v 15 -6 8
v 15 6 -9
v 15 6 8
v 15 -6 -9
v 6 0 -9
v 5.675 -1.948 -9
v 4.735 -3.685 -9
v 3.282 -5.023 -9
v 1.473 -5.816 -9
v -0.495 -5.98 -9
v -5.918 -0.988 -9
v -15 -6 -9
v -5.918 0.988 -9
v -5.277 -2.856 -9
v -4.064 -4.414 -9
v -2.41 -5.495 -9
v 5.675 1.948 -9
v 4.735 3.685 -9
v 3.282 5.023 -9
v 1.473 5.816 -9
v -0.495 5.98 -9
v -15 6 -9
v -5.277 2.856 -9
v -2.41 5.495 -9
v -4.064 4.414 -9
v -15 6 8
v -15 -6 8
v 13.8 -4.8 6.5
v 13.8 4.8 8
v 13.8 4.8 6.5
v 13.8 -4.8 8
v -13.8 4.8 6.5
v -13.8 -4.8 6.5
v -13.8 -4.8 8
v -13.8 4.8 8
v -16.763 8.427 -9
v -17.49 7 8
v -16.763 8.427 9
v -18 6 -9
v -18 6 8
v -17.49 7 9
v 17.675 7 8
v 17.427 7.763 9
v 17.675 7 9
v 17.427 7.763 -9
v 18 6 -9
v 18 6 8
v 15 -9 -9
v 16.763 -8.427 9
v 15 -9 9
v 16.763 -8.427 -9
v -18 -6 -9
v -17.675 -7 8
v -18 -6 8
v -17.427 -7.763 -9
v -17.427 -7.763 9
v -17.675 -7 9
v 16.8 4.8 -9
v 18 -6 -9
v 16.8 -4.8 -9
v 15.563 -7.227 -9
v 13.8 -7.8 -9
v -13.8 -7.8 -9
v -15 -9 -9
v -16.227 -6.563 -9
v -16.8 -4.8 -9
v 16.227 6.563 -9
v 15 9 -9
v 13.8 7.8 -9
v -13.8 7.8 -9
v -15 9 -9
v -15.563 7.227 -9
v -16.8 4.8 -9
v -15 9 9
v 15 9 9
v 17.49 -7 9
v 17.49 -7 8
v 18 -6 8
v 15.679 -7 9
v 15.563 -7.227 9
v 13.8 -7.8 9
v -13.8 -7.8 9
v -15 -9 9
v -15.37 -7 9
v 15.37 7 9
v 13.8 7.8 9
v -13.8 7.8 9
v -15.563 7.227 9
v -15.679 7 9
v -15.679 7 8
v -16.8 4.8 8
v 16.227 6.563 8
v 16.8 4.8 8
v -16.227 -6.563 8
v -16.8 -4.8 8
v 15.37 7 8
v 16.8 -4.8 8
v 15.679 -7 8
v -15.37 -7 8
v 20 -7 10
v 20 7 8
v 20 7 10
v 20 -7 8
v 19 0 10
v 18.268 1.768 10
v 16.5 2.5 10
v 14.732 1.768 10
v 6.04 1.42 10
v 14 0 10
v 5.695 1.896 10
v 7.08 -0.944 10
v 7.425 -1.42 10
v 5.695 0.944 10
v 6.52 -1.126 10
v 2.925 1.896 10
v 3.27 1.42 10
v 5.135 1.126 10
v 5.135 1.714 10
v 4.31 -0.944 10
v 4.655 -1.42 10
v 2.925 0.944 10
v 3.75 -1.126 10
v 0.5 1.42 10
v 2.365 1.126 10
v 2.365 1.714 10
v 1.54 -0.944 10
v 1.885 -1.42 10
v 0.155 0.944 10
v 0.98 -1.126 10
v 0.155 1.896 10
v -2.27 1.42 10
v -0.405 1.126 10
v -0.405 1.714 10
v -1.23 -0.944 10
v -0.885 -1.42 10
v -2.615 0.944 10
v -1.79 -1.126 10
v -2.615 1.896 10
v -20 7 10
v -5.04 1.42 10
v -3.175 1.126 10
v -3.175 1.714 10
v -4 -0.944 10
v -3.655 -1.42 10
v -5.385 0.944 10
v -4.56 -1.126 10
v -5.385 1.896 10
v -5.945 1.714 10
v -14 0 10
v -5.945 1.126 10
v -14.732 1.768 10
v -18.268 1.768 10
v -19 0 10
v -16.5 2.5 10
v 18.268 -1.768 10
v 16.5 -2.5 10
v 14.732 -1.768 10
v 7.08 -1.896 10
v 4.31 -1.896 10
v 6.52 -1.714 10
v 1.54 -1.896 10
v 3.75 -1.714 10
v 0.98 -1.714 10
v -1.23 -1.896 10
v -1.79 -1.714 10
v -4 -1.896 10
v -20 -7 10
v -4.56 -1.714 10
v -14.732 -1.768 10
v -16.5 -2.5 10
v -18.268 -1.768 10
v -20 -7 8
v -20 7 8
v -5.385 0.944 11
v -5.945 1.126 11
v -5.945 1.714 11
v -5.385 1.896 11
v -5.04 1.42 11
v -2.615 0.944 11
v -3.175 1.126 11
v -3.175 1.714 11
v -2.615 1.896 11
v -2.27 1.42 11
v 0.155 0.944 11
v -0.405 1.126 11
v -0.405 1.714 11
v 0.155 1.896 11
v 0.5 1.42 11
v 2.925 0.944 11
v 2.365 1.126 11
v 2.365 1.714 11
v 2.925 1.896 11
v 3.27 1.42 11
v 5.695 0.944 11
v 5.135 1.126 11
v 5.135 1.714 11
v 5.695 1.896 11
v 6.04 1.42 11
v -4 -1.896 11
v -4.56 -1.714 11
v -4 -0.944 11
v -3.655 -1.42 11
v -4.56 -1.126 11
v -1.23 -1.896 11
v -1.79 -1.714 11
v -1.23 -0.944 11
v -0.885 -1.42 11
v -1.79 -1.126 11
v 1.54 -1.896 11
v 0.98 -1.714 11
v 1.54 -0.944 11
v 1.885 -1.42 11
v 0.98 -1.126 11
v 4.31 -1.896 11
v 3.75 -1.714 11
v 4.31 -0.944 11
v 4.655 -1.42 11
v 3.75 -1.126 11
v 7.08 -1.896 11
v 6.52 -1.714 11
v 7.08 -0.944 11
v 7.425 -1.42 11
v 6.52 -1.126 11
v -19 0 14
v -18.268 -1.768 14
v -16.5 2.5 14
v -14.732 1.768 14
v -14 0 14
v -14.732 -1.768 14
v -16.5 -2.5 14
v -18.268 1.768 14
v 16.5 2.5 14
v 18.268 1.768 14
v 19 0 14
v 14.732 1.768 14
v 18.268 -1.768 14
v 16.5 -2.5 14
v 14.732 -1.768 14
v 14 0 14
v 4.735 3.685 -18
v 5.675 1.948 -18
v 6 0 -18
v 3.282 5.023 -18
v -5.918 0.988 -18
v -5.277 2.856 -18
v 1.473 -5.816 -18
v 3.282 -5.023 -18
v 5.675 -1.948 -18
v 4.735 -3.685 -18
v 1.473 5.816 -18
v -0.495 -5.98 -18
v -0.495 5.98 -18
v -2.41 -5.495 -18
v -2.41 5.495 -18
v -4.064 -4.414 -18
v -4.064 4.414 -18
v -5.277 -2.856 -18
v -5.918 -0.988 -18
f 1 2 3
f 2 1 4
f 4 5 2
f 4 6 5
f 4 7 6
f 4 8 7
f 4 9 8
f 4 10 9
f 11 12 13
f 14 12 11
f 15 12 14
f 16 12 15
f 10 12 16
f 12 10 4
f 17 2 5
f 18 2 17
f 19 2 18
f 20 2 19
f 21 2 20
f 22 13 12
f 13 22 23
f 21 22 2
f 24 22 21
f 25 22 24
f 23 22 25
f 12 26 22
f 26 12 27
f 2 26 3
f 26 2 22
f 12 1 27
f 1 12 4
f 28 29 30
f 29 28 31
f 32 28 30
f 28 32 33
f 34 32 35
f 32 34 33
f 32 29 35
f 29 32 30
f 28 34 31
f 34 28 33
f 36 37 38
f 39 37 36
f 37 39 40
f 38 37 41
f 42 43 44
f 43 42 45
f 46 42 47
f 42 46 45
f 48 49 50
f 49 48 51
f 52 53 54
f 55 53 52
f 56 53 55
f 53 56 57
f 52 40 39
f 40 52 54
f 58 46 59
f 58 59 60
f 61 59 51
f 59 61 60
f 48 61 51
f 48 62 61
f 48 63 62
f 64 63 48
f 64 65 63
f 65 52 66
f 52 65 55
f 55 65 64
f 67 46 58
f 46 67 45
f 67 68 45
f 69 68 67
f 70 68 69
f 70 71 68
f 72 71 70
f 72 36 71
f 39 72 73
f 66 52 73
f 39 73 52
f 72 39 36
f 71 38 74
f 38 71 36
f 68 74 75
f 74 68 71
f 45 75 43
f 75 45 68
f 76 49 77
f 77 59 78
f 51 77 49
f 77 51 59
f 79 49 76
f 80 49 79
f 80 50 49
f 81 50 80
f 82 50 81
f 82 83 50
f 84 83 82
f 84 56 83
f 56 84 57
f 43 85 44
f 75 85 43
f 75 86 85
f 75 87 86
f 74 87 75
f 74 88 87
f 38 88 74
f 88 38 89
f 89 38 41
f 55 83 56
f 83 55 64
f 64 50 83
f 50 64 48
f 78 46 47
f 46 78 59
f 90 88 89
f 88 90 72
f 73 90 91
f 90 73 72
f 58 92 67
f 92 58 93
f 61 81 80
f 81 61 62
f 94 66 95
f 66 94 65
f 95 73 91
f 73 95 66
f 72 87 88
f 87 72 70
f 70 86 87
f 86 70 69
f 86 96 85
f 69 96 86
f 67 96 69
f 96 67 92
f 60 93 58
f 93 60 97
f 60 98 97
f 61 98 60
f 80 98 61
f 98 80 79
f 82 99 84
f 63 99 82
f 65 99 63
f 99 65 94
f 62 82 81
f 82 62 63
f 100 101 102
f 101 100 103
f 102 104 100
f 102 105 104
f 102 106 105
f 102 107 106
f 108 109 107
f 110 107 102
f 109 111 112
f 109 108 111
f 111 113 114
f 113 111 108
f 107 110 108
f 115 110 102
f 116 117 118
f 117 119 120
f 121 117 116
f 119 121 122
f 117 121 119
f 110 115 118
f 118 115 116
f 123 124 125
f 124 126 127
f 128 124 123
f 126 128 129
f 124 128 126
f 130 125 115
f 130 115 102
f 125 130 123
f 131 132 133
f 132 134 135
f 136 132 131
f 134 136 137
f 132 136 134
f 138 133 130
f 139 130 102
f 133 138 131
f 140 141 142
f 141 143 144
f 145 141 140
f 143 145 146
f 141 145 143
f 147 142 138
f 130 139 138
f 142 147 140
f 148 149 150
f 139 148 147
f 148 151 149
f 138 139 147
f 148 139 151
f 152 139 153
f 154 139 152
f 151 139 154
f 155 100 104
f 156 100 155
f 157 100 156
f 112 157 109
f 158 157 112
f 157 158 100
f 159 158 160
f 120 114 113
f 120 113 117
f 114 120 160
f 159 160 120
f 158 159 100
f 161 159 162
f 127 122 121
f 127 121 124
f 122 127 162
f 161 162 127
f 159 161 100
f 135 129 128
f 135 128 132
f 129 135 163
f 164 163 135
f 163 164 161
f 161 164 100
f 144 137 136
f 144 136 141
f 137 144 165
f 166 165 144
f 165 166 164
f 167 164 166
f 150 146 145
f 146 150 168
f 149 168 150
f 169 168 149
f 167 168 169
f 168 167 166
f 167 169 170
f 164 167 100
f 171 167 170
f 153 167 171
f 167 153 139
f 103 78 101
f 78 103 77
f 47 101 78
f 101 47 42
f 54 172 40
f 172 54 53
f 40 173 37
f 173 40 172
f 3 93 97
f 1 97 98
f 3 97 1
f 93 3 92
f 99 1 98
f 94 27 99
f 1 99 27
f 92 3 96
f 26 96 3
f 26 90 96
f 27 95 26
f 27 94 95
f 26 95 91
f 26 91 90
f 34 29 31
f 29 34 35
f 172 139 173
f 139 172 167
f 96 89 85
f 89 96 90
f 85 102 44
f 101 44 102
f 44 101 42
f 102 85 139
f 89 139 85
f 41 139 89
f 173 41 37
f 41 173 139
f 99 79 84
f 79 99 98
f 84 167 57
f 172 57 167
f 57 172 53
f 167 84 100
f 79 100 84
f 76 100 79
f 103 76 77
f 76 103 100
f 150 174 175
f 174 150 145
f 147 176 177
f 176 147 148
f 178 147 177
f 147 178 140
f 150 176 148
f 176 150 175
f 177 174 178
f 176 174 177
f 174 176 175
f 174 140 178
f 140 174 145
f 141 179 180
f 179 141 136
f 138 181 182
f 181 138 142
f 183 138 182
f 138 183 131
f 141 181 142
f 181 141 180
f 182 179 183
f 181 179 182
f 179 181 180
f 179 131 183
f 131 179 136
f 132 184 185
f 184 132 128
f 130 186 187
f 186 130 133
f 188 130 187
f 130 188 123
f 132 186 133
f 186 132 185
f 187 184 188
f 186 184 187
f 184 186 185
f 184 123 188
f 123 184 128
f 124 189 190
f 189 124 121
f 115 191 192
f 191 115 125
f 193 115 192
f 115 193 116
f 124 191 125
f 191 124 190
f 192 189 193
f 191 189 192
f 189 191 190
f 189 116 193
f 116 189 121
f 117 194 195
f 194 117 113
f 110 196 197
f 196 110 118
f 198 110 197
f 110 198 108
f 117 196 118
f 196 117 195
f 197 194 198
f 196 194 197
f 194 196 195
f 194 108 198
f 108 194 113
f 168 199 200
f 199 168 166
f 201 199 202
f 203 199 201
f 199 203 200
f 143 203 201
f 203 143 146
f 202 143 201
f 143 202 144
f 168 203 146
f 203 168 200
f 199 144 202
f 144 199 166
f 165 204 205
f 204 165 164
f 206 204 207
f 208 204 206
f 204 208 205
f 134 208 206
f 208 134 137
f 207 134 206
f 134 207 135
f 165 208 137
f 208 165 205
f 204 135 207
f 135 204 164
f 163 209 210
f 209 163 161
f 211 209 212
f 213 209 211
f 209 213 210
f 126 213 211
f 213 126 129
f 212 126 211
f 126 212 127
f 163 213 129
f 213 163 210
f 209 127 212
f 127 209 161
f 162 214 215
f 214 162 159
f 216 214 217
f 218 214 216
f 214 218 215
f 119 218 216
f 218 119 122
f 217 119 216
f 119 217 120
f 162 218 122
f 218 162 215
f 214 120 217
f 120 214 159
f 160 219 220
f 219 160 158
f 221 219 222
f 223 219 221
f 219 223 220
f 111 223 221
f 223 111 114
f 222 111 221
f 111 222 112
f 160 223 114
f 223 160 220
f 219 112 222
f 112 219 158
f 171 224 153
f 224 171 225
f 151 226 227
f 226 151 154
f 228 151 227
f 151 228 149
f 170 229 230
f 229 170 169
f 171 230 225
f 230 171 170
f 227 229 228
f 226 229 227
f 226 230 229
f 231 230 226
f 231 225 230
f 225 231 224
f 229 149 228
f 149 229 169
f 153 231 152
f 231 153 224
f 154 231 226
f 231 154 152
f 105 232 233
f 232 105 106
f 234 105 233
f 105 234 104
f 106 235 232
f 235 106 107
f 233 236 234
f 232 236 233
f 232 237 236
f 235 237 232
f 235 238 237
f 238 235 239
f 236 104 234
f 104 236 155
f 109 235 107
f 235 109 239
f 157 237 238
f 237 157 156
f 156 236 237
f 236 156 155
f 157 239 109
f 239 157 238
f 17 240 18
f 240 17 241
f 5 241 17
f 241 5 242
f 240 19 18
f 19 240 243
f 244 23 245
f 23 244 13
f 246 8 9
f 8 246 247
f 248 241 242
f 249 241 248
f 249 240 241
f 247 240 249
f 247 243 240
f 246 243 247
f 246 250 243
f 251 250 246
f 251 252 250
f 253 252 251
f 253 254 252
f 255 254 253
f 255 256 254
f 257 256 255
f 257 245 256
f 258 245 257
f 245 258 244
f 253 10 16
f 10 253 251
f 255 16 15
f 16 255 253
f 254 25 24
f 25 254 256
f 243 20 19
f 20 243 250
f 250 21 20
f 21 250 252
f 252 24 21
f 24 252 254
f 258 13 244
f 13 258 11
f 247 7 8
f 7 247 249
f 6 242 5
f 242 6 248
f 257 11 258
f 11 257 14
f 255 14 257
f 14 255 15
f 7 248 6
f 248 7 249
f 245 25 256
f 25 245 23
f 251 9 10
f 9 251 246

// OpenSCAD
// Parameters
body_width = 30; //[15:60:1]
body_height = 12; //[6:24:1]
body_depth = 18; //[9:36:1]
shell_thickness = 1.2; //[0.6:2.4:0.1]
face_recess_depth = 1.5; //[0.8:3:0.1]
flange_width = 40; //[20:80:1]
flange_height = 14; //[7:28:1]
flange_thickness = 2; //[1:4:0.1]
mount_hole_diameter = 3.2; //[1.6:6.4:0.1]
mount_hole_spacing = 33; //[16.5:66:0.5]
pin_rows = 2; //[1:3:1]
pins_per_row = 5; //[3:15:1]
pin_pitch_x = 2.77; //[1.5:5.5:0.01]
pin_pitch_y = 2.84; //[1.5:6:0.01]
pin_diameter = 1; //[0.5:2:0.05]
pin_length = 3; //[1.5:8:0.1]
overlap = 1; //[0.5:2:0.1]
shell_corner_radius = 3; //[1.5:6:0.1]
lip_height = 0.8; //[0.4:2:0.1]
lip_thickness = 0.8; //[0.4:2:0.1]
key_width = 4; //[2:8:0.1]
key_height = 2; //[1:4:0.1]
key_depth = 1.2; //[0.6:3:0.1]
jackscrew_diameter = 5; //[3:8:0.1]
jackscrew_length = 6; //[3:12:0.1]
strain_relief_diameter = 12; //[6:24:0.5]
strain_relief_length = 10; //[5:25:0.5]
pin_chamfer_scale = 0.75; //[0.5:0.95:0.01]
shell_chamfer_scale = 0.92; //[0.85:0.98:0.01]

// Base Shapes
module connector_body() {
  color("DimGray")
  translate([0, 0, 0])
    cube([body_width, body_height, body_depth], center=true);
}

module d_shaped_shell_outer() {
  color("Silver")
  translate([0, 0, 0])
    linear_extrude(height=body_depth, center=true)
      offset(r=shell_corner_radius)
        square([body_width, body_height], center=true);
}

module d_shaped_shell_inner() {
  translate([0, 0, 0])
    linear_extrude(height=body_depth + 2*overlap, center=true)
      offset(r=shell_corner_radius)
        square([body_width - 2*shell_thickness, body_height - 2*shell_thickness], center=true);
}

module mating_face_recess_cut() {
  translate([0, 0, body_depth/2 - face_recess_depth/2])
    cube([body_width - 2*shell_thickness, body_height - 2*shell_thickness, face_recess_depth + 2*overlap], center=true);
}

module mounting_flange_blank() {
  color("Silver")
  translate([0, 0, body_depth/2 - flange_thickness/2 + overlap])
    cube([flange_width, flange_height, flange_thickness], center=true);
}

module mount_hole_left() {
  translate([-mount_hole_spacing/2, 0, body_depth/2 - flange_thickness/2 + overlap])
    cylinder(r=mount_hole_diameter/2, h=flange_thickness + 2*overlap, center=true);
}

module mount_hole_right() {
  translate([mount_hole_spacing/2, 0, body_depth/2 - flange_thickness/2 + overlap])
    cylinder(r=mount_hole_diameter/2, h=flange_thickness + 2*overlap, center=true);
}

module jackscrew_left() {
  color("Black")
  translate([-mount_hole_spacing/2, 0, body_depth/2 + jackscrew_length/2 - overlap])
    cylinder(r=jackscrew_diameter/2, h=jackscrew_length, center=true);
}

module jackscrew_right() {
  color("Black")
  translate([mount_hole_spacing/2, 0, body_depth/2 + jackscrew_length/2 - overlap])
    cylinder(r=jackscrew_diameter/2, h=jackscrew_length, center=true);
}

module rear_strain_relief() {
  color("Black")
  translate([0, 0, -body_depth/2 - strain_relief_length/2 + overlap])
    cylinder(r=strain_relief_diameter/2, h=strain_relief_length, center=true);
}

module pin(position) {
  translate(position)
    cylinder(r=pin_diameter/2, h=pin_length, center=true);
}

module pin_tip(position) {
  translate(position)
    scale([pin_chamfer_scale, pin_chamfer_scale, 1])
      cylinder(r1=pin_diameter/2, r2=0, h=pin_diameter, center=true);
}

module shell_lip_outer() {
  color("Silver")
  translate([0, 0, body_depth/2 - lip_height/2])
    linear_extrude(height=lip_height, center=true)
      offset(r=shell_corner_radius)
        square([body_width, body_height], center=true);
}

module shell_lip_inner_cut() {
  translate([0, 0, body_depth/2 - lip_height/2])
    linear_extrude(height=lip_height + 2*overlap, center=true)
      offset(r=shell_corner_radius)
        square([body_width - 2*lip_thickness, body_height - 2*lip_thickness], center=true);
}

module shell_lip_chamfer_tool() {
  translate([0, 0, body_depth/2 - lip_height/2])
    linear_extrude(height=lip_height, center=true)
      offset(r=shell_corner_radius)
        square([body_width, body_height], center=true);
}

module keying_details_cut() {
  translate([0, -(body_height/2 - shell_thickness - key_height/2), body_depth/2 - key_depth/2])
    cube([key_width, key_height, key_depth + 2*overlap], center=true);
}

// Operations
module d_shaped_shell() {
  difference() {
    d_shaped_shell_outer();
    d_shaped_shell_inner();
  }
}

module mating_face() {
  difference() {
    connector_body();
    mating_face_recess_cut();
    keying_details_cut();
  }
}

module mounting_holes() {
  union() {
    mount_hole_left();
    mount_hole_right();
  }
}

module mounting_flange() {
  difference() {
    mounting_flange_blank();
    mounting_holes();
  }
}

module pin_array() {
  union() {
    pin([-2*pin_pitch_x, pin_pitch_y/2, body_depth/2 + pin_length/2 - overlap]);
    pin([-pin_pitch_x, pin_pitch_y/2, body_depth/2 + pin_length/2 - overlap]);
    pin([0, pin_pitch_y/2, body_depth/2 + pin_length/2 - overlap]);
    pin([pin_pitch_x, pin_pitch_y/2, body_depth/2 + pin_length/2 - overlap]);
    pin([2*pin_pitch_x, pin_pitch_y/2, body_depth/2 + pin_length/2 - overlap]);
    pin([-2*pin_pitch_x + pin_pitch_x/2, -pin_pitch_y/2, body_depth/2 + pin_length/2 - overlap]);
    pin([-pin_pitch_x + pin_pitch_x/2, -pin_pitch_y/2, body_depth/2 + pin_length/2 - overlap]);
    pin([0 + pin_pitch_x/2, -pin_pitch_y/2, body_depth/2 + pin_length/2 - overlap]);
    pin([pin_pitch_x + pin_pitch_x/2, -pin_pitch_y/2, body_depth/2 + pin_length/2 - overlap]);
    pin([2*pin_pitch_x + pin_pitch_x/2, -pin_pitch_y/2, body_depth/2 + pin_length/2 - overlap]);
  }
}

module pin_chamfers() {
  union() {
    pin_tip([-2*pin_pitch_x, pin_pitch_y/2, body_depth/2 + pin_length - pin_diameter/2 - overlap]);
    pin_tip([-pin_pitch_x, pin_pitch_y/2, body_depth/2 + pin_length - pin_diameter/2 - overlap]);
    pin_tip([0, pin_pitch_y/2, body_depth/2 + pin_length - pin_diameter/2 - overlap]);
    pin_tip([pin_pitch_x, pin_pitch_y/2, body_depth/2 + pin_length - pin_diameter/2 - overlap]);
    pin_tip([2*pin_pitch_x, pin_pitch_y/2, body_depth/2 + pin_length - pin_diameter/2 - overlap]);
    pin_tip([-2*pin_pitch_x + pin_pitch_x/2, -pin_pitch_y/2, body_depth/2 + pin_length - pin_diameter/2 - overlap]);
    pin_tip([-pin_pitch_x + pin_pitch_x/2, -pin_pitch_y/2, body_depth/2 + pin_length - pin_diameter/2 - overlap]);
    pin_tip([0 + pin_pitch_x/2, -pin_pitch_y/2, body_depth/2 + pin_length - pin_diameter/2 - overlap]);
    pin_tip([pin_pitch_x + pin_pitch_x/2, -pin_pitch_y/2, body_depth/2 + pin_length - pin_diameter/2 - overlap]);
    pin_tip([2*pin_pitch_x + pin_pitch_x/2, -pin_pitch_y/2, body_depth/2 + pin_length - pin_diameter/2 - overlap]);
  }
}

module shell_lip_ring() {
  difference() {
    shell_lip_outer();
    shell_lip_inner_cut();
  }
}

module shell_lip_chamfers() {
  difference() {
    shell_lip_ring();
    scale([shell_chamfer_scale, shell_chamfer_scale, 1])
      shell_lip_chamfer_tool();
  }
}

module jackscrews() {
  union() {
    jackscrew_left();
    jackscrew_right();
  }
}

module connector_body_with_shell() {
  union() {
    mating_face();
    d_shaped_shell();
  }
}

module connector_body_with_flange() {
  union() {
    connector_body_with_shell();
    mounting_flange();
  }
}

module connector_body_with_lip() {
  union() {
    connector_body_with_flange();
    shell_lip_chamfers();
  }
}

module connector_body_with_pins() {
  union() {
    connector_body_with_lip();
    pin_array();
    pin_chamfers();
  }
}

module connector_body_with_hardware() {
  union() {
    connector_body_with_pins();
    jackscrews();
  }
}

module complete_model() {
  union() {
    connector_body_with_hardware();
    rear_strain_relief();
  }
}

// Final Output
complete_model();
